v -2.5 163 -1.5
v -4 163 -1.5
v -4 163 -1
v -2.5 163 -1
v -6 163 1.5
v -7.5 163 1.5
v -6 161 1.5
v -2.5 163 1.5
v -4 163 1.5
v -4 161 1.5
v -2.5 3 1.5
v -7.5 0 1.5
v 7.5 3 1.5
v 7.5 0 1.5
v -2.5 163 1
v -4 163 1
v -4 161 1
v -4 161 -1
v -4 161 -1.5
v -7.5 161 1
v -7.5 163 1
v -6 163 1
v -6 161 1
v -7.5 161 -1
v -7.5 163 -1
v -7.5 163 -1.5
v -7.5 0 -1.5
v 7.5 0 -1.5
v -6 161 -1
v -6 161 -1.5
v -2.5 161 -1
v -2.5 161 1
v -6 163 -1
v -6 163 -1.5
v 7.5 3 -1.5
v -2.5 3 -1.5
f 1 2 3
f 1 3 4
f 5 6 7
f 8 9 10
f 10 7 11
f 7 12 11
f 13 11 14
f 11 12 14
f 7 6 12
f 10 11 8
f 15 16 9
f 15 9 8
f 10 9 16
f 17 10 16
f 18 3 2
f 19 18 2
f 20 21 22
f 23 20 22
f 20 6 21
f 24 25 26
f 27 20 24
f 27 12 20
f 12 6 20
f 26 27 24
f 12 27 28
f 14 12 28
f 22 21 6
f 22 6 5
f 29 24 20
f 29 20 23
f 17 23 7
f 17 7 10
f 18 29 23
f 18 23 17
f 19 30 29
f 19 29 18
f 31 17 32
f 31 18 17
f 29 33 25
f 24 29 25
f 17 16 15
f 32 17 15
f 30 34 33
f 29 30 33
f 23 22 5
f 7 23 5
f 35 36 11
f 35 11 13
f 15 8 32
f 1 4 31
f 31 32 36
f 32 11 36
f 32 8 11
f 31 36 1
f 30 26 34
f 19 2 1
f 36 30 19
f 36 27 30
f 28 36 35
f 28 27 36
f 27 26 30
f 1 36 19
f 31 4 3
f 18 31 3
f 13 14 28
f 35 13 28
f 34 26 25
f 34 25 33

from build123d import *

# Parameters (mm, degrees)
SKETCH1_W           = 15
SKETCH1_H           = 3
BOSS_EXTRUDE1_DEPTH = 3
SKETCH2_W           = 5
SKETCH2_H           = 3
BOSS_EXTRUDE2_DEPTH = 160
CUT_EXTRUDE1_DEPTH  = 2


with BuildPart() as part:
    # Sketch1 → Boss-Extrude1 (new body)
    with BuildSketch(Plane(origin=(0, 0, 0), x_dir=(1, 0, 0), z_dir=(0, 1, 0))):
        Rectangle(SKETCH1_W, SKETCH1_H)
    extrude(amount=BOSS_EXTRUDE1_DEPTH)

    # Sketch2 → Boss-Extrude2 (add)
    with BuildSketch(Plane(origin=(0, 3, 0), x_dir=(1, 0, 0), z_dir=(0, 1, 0))):
        with Locations((-5, 0)):
            Rectangle(SKETCH2_W, SKETCH2_H)
    extrude(amount=BOSS_EXTRUDE2_DEPTH)

    # Sketch3 → Cut-Extrude1 (cut)
    with BuildSketch(Plane(origin=(0, 163, 0), x_dir=(1, 0, 0), z_dir=(0, 1, 0))):
        Polygon((-6, 1), (-7.5, 1), (-7.5, -1), (-6, -1), (-6, -1.5), (-4, -1.5), (-4, -1), (-2.5, -1), (-2.5, 1), (-4, 1), (-4, 1.5), (-6, 1.5), align=None)
    extrude(amount=-CUT_EXTRUDE1_DEPTH, mode=Mode.SUBTRACT)


solid = part.part
